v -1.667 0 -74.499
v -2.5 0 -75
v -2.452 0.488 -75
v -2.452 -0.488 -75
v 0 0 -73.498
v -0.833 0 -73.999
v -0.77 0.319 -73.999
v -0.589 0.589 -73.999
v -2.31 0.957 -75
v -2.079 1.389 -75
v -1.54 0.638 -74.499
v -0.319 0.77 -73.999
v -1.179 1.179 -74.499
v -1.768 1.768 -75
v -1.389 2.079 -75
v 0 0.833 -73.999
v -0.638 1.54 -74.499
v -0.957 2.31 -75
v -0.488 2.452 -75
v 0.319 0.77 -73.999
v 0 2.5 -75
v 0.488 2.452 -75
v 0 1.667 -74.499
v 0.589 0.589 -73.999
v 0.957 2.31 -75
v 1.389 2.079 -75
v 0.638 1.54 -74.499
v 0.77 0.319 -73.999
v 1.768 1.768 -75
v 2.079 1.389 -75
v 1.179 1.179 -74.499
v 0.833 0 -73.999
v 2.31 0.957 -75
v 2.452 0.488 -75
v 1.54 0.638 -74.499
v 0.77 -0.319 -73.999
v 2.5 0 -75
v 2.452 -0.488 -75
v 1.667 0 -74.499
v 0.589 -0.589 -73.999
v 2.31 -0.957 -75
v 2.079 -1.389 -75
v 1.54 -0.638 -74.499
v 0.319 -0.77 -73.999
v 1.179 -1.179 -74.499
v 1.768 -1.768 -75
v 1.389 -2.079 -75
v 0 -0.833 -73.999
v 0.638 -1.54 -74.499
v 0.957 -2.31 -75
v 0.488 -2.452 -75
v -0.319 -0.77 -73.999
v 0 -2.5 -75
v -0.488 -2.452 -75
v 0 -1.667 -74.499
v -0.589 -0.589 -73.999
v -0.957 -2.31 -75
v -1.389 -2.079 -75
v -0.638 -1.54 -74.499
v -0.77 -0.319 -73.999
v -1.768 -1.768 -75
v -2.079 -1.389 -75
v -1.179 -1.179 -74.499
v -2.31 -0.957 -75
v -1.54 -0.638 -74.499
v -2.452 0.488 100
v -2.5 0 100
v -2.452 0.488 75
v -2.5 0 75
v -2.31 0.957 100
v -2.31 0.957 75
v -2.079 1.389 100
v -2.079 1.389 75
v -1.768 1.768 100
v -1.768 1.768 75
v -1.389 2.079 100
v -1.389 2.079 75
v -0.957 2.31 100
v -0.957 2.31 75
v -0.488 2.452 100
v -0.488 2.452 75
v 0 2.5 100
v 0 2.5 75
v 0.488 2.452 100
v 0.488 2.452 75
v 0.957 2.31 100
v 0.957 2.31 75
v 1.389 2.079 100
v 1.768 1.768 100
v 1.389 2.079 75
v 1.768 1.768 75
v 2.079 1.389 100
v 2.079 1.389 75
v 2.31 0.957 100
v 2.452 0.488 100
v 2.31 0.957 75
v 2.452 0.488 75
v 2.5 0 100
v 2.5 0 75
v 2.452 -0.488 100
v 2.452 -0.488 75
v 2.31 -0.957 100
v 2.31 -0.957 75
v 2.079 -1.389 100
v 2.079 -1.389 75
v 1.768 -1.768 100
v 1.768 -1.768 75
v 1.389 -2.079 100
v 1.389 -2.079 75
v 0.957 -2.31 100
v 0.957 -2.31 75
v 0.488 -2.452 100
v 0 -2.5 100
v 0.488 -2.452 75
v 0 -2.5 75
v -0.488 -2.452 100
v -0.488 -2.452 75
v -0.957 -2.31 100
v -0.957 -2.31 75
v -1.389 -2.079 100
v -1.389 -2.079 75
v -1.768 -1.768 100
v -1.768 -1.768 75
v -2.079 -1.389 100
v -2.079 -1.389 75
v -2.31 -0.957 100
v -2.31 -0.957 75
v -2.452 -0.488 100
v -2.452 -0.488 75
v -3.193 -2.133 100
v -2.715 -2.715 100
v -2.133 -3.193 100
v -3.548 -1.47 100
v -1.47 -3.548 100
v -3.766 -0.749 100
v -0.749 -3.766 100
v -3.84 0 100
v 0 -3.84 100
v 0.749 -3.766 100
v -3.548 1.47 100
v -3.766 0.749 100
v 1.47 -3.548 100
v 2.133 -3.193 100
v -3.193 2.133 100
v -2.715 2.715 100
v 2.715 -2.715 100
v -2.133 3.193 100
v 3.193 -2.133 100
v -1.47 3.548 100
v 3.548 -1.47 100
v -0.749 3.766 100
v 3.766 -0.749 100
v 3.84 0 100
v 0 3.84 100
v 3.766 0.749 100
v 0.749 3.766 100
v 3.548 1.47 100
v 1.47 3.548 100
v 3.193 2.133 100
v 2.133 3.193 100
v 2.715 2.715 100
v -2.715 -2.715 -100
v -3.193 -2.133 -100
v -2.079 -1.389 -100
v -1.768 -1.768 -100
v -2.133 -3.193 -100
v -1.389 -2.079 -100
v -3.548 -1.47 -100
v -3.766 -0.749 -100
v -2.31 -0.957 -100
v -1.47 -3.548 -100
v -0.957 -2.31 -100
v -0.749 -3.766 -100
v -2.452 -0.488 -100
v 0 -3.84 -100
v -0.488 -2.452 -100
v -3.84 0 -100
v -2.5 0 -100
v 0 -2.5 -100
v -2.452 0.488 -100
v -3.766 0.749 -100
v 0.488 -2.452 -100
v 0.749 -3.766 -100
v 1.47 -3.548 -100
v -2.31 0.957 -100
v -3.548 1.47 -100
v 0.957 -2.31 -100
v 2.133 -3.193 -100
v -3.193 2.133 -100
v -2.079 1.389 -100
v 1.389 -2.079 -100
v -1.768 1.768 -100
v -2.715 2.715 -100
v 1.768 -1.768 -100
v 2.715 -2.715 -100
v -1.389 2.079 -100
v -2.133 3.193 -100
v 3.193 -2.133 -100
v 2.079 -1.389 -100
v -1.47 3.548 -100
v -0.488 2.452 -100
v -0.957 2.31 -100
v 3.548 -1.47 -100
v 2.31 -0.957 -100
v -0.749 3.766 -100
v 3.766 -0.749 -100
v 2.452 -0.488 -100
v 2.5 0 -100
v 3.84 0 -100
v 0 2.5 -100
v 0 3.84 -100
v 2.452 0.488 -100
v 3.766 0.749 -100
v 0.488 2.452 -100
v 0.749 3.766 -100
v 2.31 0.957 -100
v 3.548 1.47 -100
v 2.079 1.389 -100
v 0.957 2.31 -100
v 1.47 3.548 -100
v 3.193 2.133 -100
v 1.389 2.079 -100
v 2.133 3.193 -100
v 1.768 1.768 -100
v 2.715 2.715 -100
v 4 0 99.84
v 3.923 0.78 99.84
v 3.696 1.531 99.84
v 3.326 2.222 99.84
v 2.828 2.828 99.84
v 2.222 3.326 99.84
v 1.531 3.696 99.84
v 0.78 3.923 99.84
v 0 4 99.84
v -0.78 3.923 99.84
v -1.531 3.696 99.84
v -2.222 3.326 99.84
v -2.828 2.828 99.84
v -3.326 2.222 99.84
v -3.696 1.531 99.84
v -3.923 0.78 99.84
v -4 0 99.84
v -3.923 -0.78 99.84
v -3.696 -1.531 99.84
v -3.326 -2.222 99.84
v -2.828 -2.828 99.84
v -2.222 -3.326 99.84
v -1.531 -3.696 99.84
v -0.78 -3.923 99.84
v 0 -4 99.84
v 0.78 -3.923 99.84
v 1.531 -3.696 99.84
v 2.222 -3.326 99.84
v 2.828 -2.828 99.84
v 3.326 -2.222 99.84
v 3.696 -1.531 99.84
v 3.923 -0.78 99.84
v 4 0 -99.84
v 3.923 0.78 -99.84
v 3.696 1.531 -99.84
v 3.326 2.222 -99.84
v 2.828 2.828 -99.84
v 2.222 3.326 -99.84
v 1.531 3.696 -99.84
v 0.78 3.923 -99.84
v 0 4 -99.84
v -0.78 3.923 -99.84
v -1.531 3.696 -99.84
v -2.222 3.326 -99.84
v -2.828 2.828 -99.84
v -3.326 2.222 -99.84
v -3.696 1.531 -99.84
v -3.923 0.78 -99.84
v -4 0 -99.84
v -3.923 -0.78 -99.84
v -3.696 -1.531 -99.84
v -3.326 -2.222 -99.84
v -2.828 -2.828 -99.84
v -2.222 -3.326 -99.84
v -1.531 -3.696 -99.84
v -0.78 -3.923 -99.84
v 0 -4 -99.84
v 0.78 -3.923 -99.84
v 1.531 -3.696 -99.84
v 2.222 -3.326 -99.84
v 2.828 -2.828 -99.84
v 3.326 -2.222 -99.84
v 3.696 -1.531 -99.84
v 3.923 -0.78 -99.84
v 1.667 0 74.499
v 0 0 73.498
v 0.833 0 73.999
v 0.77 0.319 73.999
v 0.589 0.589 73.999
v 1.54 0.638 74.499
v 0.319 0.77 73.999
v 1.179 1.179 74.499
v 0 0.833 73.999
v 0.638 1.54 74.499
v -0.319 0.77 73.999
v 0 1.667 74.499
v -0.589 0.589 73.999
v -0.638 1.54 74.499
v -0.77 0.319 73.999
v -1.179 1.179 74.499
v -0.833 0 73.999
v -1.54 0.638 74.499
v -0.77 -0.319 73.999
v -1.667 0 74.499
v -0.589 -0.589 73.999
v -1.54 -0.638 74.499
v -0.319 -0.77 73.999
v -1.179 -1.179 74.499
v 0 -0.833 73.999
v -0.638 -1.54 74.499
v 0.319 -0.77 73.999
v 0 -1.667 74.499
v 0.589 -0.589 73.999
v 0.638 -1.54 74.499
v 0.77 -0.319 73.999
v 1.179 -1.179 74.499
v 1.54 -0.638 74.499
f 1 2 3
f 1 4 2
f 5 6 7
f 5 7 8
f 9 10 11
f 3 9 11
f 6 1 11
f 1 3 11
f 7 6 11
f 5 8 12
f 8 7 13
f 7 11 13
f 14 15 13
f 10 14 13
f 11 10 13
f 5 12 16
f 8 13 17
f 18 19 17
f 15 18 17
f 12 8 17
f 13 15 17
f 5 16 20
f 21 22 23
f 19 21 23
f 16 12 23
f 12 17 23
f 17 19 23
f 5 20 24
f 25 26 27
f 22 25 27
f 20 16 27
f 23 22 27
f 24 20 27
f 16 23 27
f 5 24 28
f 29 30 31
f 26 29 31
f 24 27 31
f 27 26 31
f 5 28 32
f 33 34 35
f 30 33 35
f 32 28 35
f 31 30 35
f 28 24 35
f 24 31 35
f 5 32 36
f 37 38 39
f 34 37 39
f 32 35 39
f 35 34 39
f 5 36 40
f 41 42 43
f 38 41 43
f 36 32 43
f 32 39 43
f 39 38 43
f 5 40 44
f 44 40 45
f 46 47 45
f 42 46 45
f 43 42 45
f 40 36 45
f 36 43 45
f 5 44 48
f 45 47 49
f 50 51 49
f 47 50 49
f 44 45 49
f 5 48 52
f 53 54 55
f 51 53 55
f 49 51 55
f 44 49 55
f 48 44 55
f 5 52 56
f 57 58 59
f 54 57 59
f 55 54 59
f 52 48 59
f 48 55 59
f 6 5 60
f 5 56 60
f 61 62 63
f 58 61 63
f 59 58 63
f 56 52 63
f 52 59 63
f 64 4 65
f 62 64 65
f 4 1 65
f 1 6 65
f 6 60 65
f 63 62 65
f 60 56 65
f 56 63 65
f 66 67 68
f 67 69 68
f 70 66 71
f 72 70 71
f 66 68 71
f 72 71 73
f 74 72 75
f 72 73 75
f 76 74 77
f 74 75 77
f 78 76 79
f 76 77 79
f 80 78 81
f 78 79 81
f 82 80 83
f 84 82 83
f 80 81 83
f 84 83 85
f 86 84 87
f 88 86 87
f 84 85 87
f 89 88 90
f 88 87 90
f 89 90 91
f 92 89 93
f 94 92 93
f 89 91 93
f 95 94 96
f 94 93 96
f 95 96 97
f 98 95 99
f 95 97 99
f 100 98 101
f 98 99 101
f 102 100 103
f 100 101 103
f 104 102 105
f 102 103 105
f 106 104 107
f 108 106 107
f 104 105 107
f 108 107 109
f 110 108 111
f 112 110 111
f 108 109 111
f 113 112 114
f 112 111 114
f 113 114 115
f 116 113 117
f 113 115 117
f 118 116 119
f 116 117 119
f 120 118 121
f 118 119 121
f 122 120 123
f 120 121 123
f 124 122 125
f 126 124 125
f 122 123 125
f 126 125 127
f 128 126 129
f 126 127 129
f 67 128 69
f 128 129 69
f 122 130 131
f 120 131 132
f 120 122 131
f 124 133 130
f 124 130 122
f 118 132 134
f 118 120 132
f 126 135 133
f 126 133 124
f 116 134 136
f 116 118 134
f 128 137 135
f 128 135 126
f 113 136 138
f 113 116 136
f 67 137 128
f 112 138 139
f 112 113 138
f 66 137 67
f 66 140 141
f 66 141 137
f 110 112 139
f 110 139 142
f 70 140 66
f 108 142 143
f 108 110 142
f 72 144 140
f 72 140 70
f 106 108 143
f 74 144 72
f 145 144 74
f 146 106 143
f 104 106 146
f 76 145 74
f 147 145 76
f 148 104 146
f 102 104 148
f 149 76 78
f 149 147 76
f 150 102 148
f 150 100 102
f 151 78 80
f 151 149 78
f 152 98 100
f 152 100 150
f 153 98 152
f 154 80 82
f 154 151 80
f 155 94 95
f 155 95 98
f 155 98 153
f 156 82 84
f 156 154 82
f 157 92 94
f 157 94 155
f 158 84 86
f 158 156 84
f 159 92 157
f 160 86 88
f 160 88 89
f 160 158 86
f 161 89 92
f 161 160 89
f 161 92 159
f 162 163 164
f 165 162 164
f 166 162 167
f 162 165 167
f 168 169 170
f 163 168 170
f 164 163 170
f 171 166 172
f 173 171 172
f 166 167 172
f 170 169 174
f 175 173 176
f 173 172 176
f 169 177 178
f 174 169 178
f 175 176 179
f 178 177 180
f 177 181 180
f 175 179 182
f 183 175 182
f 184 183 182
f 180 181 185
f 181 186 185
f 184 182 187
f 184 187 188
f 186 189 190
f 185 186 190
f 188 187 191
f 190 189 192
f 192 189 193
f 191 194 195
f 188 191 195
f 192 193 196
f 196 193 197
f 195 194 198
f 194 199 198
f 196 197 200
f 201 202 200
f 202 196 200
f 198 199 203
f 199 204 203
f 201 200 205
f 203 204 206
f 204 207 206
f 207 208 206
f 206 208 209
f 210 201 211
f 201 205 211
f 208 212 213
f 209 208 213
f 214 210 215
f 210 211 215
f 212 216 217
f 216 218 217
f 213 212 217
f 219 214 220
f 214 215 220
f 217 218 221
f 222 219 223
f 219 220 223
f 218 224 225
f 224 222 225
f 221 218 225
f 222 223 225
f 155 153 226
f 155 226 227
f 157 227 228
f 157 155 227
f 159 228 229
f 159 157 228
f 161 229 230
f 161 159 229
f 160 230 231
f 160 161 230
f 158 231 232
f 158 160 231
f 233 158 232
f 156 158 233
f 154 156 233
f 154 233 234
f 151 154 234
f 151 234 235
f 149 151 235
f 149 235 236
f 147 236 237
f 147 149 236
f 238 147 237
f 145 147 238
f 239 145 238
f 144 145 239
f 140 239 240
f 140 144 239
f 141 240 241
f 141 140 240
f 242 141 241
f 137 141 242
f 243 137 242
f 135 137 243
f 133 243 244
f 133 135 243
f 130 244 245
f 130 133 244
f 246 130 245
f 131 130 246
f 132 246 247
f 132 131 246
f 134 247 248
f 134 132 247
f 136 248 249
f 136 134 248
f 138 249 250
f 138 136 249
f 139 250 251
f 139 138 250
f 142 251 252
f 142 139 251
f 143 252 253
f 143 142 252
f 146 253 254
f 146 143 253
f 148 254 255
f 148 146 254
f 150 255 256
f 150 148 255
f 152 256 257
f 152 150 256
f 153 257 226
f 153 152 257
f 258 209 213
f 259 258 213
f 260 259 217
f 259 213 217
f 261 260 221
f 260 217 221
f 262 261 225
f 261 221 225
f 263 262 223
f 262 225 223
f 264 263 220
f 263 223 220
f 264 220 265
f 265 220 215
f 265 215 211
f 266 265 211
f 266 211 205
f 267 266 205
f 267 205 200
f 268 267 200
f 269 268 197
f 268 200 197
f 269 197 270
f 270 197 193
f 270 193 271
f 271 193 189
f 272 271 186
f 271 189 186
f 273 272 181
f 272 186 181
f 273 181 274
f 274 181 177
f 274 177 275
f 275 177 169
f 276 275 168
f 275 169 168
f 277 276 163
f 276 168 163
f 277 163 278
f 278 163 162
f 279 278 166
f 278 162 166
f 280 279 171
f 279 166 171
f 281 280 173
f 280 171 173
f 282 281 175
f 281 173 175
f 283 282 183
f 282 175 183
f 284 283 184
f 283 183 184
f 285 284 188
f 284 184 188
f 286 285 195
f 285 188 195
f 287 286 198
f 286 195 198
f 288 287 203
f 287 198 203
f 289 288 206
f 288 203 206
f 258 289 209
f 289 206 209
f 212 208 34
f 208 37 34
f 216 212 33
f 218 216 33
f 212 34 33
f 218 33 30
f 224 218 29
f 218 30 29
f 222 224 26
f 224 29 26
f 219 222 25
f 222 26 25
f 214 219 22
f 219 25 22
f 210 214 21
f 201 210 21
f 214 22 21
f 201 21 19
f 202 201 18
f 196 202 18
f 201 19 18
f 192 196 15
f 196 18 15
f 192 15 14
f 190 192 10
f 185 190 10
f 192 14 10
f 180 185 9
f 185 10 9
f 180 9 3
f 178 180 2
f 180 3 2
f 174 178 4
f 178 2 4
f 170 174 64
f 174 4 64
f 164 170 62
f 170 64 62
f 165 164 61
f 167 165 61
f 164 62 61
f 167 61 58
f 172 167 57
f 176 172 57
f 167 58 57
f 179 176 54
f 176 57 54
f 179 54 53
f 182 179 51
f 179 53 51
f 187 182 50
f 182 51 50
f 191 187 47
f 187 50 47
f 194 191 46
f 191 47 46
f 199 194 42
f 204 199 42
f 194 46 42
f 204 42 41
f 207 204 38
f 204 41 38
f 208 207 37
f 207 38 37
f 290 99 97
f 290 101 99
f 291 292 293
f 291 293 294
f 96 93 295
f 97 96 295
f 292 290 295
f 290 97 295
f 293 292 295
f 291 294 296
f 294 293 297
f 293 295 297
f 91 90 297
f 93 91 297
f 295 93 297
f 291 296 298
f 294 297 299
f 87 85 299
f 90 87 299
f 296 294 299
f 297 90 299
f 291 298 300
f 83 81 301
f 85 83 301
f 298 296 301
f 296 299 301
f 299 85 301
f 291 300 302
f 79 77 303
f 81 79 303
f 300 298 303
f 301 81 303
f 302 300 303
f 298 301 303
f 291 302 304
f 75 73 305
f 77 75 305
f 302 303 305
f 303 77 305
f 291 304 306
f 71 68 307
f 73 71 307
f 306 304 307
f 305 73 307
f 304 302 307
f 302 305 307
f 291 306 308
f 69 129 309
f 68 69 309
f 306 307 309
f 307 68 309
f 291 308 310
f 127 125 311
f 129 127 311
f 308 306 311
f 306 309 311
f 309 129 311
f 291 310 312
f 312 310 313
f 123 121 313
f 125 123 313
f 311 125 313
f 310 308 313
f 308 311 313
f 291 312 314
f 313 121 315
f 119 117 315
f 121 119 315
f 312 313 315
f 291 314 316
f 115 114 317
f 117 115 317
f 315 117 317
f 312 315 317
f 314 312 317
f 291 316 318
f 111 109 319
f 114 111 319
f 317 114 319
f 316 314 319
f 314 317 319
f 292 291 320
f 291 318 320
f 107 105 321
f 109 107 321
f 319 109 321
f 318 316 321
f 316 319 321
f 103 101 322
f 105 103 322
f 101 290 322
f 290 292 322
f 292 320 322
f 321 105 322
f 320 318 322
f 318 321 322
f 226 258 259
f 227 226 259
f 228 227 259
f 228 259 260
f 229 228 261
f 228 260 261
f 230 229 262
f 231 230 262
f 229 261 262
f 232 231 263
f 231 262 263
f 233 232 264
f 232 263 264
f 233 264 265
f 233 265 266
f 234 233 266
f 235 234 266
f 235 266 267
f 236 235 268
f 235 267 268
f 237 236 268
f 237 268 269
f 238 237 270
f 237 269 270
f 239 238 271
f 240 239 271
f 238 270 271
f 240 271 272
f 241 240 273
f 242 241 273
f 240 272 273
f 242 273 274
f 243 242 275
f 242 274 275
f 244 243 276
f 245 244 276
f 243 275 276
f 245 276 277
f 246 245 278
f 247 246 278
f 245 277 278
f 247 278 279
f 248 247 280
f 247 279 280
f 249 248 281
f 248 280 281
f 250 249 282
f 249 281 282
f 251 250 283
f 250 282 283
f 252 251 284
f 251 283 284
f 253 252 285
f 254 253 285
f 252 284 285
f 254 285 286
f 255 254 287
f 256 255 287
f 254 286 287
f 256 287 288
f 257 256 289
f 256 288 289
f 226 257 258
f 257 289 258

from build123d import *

# Parameters (mm, degrees)
BOSS_EXTRUDE1_DEPTH                 = 100
BOSS_EXTRUDE1_DEPTH_BACK            = 100
SKETCH3_R                           = 4
CHAMFER1_SIZE                       = 0.16
M6X1_0_TAPPED_HOLE1_D               = 5
M6X1_0_TAPPED_HOLE1_DEPTH           = 25
M6X1_0_TAPPED_HOLE1_TIP             = 1.502151548
M6X1_0_TAPPED_HOLE1_ON_FACE_2_D     = 5
M6X1_0_TAPPED_HOLE1_ON_FACE_2_DEPTH = 25
M6X1_0_TAPPED_HOLE1_ON_FACE_2_TIP   = 1.502151548


with BuildPart() as part:
    # Sketch3 → Boss-Extrude1 (new, two sides: drawn at the far end of the back side and taken through both)
    with BuildSketch(Plane.XY.offset(-BOSS_EXTRUDE1_DEPTH_BACK)):
        Circle(SKETCH3_R)
    extrude(amount=BOSS_EXTRUDE1_DEPTH + BOSS_EXTRUDE1_DEPTH_BACK)

    # Chamfer1
    chamfer1_edges = [part.edges().sort_by_distance(p)[0] for p in [
        (-4, 0, -100),
        (-4, 0, 100),
    ]]
    chamfer(chamfer1_edges, length=CHAMFER1_SIZE)

    # M6x1.0 Tapped Hole1
    with Locations(Plane.XY.offset(100)):
        with Locations((0, 0)):
            Hole(M6X1_0_TAPPED_HOLE1_D / 2, depth=M6X1_0_TAPPED_HOLE1_DEPTH)
            with Locations((0, 0, -(M6X1_0_TAPPED_HOLE1_DEPTH + M6X1_0_TAPPED_HOLE1_TIP / 2))):  # 118° drill point
                Cone(0, M6X1_0_TAPPED_HOLE1_D / 2, M6X1_0_TAPPED_HOLE1_TIP, mode=Mode.SUBTRACT)

    # M6x1.0 Tapped Hole1 on face 2
    with Locations(Plane(origin=(0, 0, -100), x_dir=(-1, 0, 0), z_dir=(0, 0, -1))):
        with Locations((0, 0)):
            Hole(M6X1_0_TAPPED_HOLE1_ON_FACE_2_D / 2, depth=M6X1_0_TAPPED_HOLE1_ON_FACE_2_DEPTH)
            with Locations((0, 0, -(M6X1_0_TAPPED_HOLE1_ON_FACE_2_DEPTH + M6X1_0_TAPPED_HOLE1_ON_FACE_2_TIP / 2))):  # 118° drill point
                Cone(0, M6X1_0_TAPPED_HOLE1_ON_FACE_2_D / 2, M6X1_0_TAPPED_HOLE1_ON_FACE_2_TIP, mode=Mode.SUBTRACT)


solid = part.part
